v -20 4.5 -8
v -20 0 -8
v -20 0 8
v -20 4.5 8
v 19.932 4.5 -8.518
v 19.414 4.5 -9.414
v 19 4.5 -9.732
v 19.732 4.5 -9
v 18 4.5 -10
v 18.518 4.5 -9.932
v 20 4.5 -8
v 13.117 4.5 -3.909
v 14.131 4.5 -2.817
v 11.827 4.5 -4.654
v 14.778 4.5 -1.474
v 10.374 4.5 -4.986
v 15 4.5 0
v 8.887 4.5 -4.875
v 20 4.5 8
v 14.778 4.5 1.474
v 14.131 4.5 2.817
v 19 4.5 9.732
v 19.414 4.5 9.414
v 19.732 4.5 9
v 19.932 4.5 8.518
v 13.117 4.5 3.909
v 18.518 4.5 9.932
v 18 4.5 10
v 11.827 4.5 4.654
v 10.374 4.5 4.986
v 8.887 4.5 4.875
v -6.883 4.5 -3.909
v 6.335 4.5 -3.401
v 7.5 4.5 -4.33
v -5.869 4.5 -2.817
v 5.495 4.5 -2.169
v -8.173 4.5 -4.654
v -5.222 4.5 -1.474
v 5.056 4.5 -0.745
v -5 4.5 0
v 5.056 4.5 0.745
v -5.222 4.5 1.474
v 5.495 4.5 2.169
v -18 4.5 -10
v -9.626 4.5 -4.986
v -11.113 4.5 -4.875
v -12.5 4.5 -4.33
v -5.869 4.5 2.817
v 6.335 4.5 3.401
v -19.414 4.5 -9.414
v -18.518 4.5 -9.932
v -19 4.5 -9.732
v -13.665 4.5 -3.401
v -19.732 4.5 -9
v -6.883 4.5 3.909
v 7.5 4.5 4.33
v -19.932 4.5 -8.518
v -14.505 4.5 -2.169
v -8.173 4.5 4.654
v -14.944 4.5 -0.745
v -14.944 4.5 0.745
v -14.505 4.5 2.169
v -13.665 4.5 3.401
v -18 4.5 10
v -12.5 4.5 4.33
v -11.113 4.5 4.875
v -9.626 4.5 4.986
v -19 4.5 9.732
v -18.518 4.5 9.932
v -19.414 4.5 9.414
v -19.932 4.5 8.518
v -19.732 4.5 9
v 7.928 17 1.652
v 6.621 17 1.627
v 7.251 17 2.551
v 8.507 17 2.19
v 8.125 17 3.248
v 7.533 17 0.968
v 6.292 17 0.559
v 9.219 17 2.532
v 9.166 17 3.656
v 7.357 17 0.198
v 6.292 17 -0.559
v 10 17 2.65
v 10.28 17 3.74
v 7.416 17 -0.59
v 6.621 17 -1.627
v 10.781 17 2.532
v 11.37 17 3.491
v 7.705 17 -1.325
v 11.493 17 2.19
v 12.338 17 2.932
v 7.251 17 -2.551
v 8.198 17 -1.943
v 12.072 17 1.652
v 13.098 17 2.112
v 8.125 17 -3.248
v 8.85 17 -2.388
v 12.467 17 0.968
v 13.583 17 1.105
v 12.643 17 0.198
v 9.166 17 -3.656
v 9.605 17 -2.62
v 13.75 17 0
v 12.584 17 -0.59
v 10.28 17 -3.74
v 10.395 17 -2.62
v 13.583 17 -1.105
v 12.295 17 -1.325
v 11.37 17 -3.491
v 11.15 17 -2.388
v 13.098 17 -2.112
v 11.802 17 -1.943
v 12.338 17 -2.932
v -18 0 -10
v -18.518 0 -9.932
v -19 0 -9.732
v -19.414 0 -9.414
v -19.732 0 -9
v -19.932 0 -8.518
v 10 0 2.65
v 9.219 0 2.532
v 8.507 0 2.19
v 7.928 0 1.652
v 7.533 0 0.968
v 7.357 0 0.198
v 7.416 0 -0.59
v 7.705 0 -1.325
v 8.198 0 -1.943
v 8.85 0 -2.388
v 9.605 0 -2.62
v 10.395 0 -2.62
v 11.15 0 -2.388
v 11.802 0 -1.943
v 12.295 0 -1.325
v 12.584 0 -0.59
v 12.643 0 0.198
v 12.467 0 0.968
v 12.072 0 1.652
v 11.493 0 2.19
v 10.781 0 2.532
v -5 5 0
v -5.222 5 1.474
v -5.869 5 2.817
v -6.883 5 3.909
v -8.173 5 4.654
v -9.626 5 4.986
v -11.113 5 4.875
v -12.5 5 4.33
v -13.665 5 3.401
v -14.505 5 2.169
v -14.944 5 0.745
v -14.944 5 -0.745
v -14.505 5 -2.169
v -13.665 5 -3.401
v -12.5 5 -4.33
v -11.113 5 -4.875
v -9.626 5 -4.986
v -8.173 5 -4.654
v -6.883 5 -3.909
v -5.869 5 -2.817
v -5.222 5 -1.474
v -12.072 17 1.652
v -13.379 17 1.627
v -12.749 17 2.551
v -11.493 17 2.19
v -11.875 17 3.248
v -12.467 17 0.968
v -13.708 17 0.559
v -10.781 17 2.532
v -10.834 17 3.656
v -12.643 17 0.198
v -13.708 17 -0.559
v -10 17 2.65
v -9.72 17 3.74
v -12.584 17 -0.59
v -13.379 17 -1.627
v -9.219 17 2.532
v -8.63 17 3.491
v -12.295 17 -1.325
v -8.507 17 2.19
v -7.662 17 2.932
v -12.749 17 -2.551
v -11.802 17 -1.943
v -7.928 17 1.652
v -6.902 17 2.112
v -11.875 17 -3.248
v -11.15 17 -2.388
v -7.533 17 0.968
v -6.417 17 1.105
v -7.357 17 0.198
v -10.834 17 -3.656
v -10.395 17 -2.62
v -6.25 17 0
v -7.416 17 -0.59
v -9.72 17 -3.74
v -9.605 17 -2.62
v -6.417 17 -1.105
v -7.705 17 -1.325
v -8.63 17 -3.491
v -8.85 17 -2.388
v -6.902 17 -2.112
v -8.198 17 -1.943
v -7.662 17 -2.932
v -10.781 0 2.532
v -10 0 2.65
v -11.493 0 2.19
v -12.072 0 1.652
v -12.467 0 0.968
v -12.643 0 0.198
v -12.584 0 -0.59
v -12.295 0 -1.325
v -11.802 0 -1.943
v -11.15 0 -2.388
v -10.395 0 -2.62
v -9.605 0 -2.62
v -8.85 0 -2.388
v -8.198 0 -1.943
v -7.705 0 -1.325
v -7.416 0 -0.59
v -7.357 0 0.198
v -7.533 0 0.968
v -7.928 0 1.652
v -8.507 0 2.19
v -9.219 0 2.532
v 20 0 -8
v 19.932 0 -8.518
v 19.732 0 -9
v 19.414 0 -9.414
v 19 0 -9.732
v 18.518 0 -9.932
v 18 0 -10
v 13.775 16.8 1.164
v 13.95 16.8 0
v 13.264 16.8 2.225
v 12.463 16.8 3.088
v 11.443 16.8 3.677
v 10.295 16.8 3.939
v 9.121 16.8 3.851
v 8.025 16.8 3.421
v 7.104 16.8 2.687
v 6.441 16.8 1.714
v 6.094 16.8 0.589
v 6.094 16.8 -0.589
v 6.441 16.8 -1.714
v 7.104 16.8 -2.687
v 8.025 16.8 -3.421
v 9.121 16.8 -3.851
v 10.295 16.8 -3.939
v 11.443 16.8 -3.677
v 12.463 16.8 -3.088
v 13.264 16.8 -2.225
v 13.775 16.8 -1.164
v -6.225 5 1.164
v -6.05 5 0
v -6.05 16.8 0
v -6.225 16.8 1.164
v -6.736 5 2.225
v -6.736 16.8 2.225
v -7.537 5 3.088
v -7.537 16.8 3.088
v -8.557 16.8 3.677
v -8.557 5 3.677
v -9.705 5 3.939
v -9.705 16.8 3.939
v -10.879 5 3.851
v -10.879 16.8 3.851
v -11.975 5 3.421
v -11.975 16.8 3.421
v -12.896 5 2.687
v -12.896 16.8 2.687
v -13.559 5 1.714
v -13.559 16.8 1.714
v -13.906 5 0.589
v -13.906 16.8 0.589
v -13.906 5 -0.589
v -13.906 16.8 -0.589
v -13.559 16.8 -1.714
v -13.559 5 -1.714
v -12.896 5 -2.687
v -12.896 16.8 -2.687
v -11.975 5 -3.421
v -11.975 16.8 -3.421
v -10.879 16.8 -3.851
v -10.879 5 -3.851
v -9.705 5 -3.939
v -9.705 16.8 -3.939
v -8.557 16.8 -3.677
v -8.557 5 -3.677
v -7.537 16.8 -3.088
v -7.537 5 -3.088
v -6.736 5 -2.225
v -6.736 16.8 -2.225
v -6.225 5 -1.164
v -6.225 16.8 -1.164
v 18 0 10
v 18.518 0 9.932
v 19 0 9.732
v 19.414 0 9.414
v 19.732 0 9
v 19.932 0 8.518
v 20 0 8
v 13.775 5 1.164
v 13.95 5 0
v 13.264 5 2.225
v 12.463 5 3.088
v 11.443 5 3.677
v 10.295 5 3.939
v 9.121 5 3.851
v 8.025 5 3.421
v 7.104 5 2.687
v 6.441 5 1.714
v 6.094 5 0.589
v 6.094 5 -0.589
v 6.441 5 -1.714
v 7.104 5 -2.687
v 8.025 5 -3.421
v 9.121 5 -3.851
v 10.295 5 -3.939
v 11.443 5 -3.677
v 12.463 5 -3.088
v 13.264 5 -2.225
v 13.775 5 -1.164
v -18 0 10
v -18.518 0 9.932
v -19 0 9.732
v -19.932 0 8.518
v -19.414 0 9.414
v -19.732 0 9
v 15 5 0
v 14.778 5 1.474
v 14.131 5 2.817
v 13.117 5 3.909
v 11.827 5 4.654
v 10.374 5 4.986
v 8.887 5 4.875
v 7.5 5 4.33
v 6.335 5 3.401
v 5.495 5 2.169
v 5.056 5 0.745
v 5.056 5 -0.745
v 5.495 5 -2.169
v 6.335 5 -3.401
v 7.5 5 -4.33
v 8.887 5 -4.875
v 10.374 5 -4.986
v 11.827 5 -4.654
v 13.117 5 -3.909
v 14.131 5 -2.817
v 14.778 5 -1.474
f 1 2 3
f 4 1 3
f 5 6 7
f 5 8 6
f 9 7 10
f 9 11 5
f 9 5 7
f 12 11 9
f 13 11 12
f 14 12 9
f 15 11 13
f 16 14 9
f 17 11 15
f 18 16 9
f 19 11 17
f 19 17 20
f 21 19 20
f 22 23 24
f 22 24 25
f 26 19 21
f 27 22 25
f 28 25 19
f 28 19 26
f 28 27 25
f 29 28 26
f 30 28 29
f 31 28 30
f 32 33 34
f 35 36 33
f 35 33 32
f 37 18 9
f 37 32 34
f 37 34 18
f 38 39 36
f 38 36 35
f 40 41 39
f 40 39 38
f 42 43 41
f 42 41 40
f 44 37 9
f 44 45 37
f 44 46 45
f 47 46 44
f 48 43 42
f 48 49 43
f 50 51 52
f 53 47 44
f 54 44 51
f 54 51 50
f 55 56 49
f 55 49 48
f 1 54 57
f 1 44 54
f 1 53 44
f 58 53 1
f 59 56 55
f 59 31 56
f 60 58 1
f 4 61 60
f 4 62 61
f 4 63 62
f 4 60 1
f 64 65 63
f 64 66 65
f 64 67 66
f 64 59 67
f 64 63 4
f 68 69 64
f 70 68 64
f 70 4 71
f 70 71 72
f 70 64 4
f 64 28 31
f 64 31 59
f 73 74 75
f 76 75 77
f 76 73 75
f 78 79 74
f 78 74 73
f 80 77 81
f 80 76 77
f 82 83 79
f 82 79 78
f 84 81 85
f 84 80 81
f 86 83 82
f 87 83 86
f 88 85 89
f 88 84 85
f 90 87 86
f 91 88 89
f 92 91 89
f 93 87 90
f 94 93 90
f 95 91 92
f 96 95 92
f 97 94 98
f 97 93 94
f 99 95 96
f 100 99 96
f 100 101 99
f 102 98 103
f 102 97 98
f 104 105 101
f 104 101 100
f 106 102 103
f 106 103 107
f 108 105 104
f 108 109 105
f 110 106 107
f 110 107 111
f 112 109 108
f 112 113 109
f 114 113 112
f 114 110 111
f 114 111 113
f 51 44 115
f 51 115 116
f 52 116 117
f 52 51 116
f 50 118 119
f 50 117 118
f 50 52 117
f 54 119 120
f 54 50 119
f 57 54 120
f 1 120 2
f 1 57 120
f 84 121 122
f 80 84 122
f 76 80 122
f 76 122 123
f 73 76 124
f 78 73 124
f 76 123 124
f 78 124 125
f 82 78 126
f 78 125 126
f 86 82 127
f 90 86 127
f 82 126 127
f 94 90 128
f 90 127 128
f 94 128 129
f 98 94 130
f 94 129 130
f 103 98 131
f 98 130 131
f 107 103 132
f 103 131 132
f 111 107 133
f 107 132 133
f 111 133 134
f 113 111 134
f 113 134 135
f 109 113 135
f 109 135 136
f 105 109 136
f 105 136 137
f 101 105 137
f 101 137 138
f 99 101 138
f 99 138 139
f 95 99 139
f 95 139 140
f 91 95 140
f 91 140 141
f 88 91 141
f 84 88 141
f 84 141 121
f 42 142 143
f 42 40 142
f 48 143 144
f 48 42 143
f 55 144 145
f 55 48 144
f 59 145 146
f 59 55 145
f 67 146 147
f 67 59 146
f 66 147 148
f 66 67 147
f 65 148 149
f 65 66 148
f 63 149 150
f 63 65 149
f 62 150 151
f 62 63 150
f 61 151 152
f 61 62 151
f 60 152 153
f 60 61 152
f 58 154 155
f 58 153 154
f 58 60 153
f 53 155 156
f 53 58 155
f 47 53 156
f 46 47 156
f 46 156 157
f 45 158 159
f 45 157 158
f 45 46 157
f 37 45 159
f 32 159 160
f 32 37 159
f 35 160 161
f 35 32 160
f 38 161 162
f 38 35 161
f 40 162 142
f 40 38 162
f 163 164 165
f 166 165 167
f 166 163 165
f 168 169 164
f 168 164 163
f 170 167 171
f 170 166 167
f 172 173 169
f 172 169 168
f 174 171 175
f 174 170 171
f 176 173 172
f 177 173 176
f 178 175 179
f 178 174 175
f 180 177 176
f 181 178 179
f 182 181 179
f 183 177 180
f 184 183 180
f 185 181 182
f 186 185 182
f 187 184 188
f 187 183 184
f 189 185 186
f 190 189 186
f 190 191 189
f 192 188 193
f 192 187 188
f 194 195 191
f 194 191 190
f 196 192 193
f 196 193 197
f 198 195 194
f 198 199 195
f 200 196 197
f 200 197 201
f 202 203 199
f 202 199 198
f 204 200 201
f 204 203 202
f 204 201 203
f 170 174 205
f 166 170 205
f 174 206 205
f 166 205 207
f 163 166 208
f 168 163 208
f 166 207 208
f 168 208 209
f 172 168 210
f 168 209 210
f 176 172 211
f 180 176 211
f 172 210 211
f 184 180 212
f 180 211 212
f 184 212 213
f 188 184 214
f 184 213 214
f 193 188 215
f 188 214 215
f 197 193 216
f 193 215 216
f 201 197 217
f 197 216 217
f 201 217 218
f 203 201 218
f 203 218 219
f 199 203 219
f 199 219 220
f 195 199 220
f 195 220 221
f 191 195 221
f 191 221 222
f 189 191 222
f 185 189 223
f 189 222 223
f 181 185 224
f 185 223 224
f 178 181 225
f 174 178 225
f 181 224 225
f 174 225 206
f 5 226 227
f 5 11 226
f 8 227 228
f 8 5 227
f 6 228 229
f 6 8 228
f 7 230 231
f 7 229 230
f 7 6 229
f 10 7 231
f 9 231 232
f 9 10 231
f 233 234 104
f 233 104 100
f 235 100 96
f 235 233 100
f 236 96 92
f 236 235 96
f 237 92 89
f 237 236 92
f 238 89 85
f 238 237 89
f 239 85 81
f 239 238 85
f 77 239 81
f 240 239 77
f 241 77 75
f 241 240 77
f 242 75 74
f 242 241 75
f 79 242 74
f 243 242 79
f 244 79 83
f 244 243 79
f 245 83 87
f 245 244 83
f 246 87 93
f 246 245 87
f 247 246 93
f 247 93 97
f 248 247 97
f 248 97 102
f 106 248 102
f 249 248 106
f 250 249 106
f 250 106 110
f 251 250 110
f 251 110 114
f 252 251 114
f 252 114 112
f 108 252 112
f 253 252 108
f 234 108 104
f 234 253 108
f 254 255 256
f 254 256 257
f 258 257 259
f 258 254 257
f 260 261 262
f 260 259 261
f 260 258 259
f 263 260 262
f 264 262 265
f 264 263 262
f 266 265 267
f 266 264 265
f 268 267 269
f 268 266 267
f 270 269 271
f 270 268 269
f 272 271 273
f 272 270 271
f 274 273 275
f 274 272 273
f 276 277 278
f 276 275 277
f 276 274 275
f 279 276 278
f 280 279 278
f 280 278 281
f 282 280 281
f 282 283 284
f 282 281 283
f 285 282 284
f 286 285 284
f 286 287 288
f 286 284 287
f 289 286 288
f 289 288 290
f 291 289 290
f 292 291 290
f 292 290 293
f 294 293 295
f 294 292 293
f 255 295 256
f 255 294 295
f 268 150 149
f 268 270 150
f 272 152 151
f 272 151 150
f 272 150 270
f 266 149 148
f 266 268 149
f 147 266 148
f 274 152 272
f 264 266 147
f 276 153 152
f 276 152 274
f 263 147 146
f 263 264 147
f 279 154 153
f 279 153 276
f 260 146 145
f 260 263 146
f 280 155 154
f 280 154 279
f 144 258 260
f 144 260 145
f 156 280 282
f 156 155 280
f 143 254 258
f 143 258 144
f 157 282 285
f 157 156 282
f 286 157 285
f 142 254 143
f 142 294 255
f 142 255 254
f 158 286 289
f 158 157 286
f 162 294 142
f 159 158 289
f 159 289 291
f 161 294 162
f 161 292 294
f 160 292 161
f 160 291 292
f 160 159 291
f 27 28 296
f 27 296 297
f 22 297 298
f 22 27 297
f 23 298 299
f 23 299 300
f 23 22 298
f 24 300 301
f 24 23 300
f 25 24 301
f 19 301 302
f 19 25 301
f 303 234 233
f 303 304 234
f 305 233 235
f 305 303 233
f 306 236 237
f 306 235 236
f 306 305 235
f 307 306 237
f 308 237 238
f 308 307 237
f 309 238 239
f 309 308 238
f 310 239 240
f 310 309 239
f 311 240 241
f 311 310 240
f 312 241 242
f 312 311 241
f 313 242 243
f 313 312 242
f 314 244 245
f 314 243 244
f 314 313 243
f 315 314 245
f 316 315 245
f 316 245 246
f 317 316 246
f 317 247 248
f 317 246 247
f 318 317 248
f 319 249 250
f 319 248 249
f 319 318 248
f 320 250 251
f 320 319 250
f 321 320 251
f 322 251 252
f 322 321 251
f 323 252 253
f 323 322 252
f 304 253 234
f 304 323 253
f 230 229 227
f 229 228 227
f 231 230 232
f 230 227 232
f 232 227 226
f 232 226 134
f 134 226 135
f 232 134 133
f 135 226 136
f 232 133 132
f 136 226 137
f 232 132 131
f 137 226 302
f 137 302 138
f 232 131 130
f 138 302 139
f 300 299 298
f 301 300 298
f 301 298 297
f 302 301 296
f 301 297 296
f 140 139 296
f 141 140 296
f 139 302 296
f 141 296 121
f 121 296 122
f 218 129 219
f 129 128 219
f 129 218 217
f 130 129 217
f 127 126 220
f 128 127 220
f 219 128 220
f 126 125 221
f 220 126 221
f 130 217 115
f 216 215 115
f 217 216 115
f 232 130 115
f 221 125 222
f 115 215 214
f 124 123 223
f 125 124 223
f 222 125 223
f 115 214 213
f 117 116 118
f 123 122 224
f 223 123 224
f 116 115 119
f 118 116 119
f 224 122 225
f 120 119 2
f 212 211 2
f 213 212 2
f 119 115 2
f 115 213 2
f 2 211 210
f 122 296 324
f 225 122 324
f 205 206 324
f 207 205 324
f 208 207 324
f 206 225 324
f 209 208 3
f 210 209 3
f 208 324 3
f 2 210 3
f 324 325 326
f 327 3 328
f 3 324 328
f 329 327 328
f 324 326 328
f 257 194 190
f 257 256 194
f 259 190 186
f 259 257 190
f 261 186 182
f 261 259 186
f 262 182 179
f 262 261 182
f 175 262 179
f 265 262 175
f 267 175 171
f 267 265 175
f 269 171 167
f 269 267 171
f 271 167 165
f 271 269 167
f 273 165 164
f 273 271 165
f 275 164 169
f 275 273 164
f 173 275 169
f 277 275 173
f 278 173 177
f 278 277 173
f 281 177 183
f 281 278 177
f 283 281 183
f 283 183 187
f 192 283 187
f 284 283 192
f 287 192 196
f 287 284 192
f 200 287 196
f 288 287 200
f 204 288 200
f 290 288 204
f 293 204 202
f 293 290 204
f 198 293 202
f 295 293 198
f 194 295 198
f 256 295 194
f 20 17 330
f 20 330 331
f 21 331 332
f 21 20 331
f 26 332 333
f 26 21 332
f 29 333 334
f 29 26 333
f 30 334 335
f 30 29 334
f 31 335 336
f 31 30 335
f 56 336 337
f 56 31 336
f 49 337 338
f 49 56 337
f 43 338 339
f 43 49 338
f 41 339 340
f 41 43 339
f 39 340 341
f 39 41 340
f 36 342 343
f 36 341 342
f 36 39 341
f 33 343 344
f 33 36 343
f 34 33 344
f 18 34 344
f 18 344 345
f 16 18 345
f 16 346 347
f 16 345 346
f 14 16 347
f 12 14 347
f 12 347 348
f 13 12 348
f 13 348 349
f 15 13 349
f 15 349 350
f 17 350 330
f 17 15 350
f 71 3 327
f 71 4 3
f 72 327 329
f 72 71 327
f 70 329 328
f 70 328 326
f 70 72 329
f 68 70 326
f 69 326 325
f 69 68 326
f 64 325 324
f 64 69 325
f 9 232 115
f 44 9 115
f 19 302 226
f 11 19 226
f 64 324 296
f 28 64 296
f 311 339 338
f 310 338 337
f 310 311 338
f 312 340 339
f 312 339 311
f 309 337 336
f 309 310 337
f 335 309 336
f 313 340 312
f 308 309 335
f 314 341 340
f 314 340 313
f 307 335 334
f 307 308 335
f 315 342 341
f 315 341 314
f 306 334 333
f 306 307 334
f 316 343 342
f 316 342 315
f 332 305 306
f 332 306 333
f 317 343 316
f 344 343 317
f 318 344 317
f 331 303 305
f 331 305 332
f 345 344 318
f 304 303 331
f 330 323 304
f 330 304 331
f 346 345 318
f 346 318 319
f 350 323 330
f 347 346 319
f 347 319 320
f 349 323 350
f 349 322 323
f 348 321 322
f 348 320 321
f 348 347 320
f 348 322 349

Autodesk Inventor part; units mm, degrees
ref_plane "YZ Plane" through (0, 0, 0) normal (1, 0, 0) x (0, 1, 0)
ref_plane "XZ Plane" through (0, 0, 0) normal (0, 1, 0) x (-1, 0, 0)
ref_plane "XY Plane" through (0, 0, 0) normal (0, 0, 1) x (1, 0, 0)
sketch "スケッチ1" plane through (0, 0, 0) normal (0, 1, 0) x (-1, 0, 0)
  line L0 (20, 10) -> (-20, 10)
  line L1 (-20, 10) -> (-20, -10)
  line L2 (-20, -10) -> (20, -10)
  line L3 (20, -10) -> (20, 10)
  line L4 (20, 10) -> (-20, -10) construction
  line L5 (-20, 10) -> (20, -10) construction
  point P0 (0, 0)
  dimension "d0" = 40
  dimension "d1" = 20
extrude "押し出し1" add sketch "スケッチ1" along normal blind 4.5
sketch "スケッチ2" plane through (0, 4.5, 0) normal (0, 1, 0) x (1, 0, 0)
  circle A0 centre (-10, 0) radius 5
  circle A1 centre (10, 0) radius 5
  point P0 (0, 0)
  dimension "d4" = 10
  dimension "d5" = 10
  dimension "d6" = 10
  dimension "d7" = 10
extrude "押し出し2" add sketch "スケッチ2" along normal blind 0.5
sketch "スケッチ3" plane through (-10, 5, 0) normal (0, 1, 0) x (1, 0, 0)
  circle A0 centre (0, 0) radius 5 projected
  circle A1 centre (20, 0) radius 5 projected
  circle A2 centre (0, 0) radius 3.95
  circle A3 centre (20, 0) radius 3.95
  point P0 (10, 0)
  dimension "d10" = 7.9
  dimension "d11" = 7.9
extrude "押し出し3" add sketch "スケッチ3" along normal blind 12 contours A2 | A3
sketch "スケッチ5" plane through (-10, 17, 0) normal (0, 1, 0) x (1, 0, 0)
  circle A0 centre (0, 0) radius 3.95 projected
  circle A1 centre (20, 0) radius 3.95 projected
  point P0 (10, 0)
hole "穴2" at (10, 17, 0) at (-10, 17, 0) direction (0, -1, 0) diameter 5.3 end through all clearance for "Socket Head Cap Screw" size "M5" standard "Ansi Metric M Profile"
chamfer "面取り2" distance 0.2 angle 45 2 edges at (-13.95, 17, 0) (6.05, 17, 0)
fillet "フィレット2" radius 2 4 edges at (20, 2.25, 10) (20, 2.25, -10) (-20, 2.25, 10) (-20, 2.25, -10)
equation "\"d5\" = d4"
equation "\"d11\" = d10"
properties part number "scara-base4" material "ABS プラスチック"
